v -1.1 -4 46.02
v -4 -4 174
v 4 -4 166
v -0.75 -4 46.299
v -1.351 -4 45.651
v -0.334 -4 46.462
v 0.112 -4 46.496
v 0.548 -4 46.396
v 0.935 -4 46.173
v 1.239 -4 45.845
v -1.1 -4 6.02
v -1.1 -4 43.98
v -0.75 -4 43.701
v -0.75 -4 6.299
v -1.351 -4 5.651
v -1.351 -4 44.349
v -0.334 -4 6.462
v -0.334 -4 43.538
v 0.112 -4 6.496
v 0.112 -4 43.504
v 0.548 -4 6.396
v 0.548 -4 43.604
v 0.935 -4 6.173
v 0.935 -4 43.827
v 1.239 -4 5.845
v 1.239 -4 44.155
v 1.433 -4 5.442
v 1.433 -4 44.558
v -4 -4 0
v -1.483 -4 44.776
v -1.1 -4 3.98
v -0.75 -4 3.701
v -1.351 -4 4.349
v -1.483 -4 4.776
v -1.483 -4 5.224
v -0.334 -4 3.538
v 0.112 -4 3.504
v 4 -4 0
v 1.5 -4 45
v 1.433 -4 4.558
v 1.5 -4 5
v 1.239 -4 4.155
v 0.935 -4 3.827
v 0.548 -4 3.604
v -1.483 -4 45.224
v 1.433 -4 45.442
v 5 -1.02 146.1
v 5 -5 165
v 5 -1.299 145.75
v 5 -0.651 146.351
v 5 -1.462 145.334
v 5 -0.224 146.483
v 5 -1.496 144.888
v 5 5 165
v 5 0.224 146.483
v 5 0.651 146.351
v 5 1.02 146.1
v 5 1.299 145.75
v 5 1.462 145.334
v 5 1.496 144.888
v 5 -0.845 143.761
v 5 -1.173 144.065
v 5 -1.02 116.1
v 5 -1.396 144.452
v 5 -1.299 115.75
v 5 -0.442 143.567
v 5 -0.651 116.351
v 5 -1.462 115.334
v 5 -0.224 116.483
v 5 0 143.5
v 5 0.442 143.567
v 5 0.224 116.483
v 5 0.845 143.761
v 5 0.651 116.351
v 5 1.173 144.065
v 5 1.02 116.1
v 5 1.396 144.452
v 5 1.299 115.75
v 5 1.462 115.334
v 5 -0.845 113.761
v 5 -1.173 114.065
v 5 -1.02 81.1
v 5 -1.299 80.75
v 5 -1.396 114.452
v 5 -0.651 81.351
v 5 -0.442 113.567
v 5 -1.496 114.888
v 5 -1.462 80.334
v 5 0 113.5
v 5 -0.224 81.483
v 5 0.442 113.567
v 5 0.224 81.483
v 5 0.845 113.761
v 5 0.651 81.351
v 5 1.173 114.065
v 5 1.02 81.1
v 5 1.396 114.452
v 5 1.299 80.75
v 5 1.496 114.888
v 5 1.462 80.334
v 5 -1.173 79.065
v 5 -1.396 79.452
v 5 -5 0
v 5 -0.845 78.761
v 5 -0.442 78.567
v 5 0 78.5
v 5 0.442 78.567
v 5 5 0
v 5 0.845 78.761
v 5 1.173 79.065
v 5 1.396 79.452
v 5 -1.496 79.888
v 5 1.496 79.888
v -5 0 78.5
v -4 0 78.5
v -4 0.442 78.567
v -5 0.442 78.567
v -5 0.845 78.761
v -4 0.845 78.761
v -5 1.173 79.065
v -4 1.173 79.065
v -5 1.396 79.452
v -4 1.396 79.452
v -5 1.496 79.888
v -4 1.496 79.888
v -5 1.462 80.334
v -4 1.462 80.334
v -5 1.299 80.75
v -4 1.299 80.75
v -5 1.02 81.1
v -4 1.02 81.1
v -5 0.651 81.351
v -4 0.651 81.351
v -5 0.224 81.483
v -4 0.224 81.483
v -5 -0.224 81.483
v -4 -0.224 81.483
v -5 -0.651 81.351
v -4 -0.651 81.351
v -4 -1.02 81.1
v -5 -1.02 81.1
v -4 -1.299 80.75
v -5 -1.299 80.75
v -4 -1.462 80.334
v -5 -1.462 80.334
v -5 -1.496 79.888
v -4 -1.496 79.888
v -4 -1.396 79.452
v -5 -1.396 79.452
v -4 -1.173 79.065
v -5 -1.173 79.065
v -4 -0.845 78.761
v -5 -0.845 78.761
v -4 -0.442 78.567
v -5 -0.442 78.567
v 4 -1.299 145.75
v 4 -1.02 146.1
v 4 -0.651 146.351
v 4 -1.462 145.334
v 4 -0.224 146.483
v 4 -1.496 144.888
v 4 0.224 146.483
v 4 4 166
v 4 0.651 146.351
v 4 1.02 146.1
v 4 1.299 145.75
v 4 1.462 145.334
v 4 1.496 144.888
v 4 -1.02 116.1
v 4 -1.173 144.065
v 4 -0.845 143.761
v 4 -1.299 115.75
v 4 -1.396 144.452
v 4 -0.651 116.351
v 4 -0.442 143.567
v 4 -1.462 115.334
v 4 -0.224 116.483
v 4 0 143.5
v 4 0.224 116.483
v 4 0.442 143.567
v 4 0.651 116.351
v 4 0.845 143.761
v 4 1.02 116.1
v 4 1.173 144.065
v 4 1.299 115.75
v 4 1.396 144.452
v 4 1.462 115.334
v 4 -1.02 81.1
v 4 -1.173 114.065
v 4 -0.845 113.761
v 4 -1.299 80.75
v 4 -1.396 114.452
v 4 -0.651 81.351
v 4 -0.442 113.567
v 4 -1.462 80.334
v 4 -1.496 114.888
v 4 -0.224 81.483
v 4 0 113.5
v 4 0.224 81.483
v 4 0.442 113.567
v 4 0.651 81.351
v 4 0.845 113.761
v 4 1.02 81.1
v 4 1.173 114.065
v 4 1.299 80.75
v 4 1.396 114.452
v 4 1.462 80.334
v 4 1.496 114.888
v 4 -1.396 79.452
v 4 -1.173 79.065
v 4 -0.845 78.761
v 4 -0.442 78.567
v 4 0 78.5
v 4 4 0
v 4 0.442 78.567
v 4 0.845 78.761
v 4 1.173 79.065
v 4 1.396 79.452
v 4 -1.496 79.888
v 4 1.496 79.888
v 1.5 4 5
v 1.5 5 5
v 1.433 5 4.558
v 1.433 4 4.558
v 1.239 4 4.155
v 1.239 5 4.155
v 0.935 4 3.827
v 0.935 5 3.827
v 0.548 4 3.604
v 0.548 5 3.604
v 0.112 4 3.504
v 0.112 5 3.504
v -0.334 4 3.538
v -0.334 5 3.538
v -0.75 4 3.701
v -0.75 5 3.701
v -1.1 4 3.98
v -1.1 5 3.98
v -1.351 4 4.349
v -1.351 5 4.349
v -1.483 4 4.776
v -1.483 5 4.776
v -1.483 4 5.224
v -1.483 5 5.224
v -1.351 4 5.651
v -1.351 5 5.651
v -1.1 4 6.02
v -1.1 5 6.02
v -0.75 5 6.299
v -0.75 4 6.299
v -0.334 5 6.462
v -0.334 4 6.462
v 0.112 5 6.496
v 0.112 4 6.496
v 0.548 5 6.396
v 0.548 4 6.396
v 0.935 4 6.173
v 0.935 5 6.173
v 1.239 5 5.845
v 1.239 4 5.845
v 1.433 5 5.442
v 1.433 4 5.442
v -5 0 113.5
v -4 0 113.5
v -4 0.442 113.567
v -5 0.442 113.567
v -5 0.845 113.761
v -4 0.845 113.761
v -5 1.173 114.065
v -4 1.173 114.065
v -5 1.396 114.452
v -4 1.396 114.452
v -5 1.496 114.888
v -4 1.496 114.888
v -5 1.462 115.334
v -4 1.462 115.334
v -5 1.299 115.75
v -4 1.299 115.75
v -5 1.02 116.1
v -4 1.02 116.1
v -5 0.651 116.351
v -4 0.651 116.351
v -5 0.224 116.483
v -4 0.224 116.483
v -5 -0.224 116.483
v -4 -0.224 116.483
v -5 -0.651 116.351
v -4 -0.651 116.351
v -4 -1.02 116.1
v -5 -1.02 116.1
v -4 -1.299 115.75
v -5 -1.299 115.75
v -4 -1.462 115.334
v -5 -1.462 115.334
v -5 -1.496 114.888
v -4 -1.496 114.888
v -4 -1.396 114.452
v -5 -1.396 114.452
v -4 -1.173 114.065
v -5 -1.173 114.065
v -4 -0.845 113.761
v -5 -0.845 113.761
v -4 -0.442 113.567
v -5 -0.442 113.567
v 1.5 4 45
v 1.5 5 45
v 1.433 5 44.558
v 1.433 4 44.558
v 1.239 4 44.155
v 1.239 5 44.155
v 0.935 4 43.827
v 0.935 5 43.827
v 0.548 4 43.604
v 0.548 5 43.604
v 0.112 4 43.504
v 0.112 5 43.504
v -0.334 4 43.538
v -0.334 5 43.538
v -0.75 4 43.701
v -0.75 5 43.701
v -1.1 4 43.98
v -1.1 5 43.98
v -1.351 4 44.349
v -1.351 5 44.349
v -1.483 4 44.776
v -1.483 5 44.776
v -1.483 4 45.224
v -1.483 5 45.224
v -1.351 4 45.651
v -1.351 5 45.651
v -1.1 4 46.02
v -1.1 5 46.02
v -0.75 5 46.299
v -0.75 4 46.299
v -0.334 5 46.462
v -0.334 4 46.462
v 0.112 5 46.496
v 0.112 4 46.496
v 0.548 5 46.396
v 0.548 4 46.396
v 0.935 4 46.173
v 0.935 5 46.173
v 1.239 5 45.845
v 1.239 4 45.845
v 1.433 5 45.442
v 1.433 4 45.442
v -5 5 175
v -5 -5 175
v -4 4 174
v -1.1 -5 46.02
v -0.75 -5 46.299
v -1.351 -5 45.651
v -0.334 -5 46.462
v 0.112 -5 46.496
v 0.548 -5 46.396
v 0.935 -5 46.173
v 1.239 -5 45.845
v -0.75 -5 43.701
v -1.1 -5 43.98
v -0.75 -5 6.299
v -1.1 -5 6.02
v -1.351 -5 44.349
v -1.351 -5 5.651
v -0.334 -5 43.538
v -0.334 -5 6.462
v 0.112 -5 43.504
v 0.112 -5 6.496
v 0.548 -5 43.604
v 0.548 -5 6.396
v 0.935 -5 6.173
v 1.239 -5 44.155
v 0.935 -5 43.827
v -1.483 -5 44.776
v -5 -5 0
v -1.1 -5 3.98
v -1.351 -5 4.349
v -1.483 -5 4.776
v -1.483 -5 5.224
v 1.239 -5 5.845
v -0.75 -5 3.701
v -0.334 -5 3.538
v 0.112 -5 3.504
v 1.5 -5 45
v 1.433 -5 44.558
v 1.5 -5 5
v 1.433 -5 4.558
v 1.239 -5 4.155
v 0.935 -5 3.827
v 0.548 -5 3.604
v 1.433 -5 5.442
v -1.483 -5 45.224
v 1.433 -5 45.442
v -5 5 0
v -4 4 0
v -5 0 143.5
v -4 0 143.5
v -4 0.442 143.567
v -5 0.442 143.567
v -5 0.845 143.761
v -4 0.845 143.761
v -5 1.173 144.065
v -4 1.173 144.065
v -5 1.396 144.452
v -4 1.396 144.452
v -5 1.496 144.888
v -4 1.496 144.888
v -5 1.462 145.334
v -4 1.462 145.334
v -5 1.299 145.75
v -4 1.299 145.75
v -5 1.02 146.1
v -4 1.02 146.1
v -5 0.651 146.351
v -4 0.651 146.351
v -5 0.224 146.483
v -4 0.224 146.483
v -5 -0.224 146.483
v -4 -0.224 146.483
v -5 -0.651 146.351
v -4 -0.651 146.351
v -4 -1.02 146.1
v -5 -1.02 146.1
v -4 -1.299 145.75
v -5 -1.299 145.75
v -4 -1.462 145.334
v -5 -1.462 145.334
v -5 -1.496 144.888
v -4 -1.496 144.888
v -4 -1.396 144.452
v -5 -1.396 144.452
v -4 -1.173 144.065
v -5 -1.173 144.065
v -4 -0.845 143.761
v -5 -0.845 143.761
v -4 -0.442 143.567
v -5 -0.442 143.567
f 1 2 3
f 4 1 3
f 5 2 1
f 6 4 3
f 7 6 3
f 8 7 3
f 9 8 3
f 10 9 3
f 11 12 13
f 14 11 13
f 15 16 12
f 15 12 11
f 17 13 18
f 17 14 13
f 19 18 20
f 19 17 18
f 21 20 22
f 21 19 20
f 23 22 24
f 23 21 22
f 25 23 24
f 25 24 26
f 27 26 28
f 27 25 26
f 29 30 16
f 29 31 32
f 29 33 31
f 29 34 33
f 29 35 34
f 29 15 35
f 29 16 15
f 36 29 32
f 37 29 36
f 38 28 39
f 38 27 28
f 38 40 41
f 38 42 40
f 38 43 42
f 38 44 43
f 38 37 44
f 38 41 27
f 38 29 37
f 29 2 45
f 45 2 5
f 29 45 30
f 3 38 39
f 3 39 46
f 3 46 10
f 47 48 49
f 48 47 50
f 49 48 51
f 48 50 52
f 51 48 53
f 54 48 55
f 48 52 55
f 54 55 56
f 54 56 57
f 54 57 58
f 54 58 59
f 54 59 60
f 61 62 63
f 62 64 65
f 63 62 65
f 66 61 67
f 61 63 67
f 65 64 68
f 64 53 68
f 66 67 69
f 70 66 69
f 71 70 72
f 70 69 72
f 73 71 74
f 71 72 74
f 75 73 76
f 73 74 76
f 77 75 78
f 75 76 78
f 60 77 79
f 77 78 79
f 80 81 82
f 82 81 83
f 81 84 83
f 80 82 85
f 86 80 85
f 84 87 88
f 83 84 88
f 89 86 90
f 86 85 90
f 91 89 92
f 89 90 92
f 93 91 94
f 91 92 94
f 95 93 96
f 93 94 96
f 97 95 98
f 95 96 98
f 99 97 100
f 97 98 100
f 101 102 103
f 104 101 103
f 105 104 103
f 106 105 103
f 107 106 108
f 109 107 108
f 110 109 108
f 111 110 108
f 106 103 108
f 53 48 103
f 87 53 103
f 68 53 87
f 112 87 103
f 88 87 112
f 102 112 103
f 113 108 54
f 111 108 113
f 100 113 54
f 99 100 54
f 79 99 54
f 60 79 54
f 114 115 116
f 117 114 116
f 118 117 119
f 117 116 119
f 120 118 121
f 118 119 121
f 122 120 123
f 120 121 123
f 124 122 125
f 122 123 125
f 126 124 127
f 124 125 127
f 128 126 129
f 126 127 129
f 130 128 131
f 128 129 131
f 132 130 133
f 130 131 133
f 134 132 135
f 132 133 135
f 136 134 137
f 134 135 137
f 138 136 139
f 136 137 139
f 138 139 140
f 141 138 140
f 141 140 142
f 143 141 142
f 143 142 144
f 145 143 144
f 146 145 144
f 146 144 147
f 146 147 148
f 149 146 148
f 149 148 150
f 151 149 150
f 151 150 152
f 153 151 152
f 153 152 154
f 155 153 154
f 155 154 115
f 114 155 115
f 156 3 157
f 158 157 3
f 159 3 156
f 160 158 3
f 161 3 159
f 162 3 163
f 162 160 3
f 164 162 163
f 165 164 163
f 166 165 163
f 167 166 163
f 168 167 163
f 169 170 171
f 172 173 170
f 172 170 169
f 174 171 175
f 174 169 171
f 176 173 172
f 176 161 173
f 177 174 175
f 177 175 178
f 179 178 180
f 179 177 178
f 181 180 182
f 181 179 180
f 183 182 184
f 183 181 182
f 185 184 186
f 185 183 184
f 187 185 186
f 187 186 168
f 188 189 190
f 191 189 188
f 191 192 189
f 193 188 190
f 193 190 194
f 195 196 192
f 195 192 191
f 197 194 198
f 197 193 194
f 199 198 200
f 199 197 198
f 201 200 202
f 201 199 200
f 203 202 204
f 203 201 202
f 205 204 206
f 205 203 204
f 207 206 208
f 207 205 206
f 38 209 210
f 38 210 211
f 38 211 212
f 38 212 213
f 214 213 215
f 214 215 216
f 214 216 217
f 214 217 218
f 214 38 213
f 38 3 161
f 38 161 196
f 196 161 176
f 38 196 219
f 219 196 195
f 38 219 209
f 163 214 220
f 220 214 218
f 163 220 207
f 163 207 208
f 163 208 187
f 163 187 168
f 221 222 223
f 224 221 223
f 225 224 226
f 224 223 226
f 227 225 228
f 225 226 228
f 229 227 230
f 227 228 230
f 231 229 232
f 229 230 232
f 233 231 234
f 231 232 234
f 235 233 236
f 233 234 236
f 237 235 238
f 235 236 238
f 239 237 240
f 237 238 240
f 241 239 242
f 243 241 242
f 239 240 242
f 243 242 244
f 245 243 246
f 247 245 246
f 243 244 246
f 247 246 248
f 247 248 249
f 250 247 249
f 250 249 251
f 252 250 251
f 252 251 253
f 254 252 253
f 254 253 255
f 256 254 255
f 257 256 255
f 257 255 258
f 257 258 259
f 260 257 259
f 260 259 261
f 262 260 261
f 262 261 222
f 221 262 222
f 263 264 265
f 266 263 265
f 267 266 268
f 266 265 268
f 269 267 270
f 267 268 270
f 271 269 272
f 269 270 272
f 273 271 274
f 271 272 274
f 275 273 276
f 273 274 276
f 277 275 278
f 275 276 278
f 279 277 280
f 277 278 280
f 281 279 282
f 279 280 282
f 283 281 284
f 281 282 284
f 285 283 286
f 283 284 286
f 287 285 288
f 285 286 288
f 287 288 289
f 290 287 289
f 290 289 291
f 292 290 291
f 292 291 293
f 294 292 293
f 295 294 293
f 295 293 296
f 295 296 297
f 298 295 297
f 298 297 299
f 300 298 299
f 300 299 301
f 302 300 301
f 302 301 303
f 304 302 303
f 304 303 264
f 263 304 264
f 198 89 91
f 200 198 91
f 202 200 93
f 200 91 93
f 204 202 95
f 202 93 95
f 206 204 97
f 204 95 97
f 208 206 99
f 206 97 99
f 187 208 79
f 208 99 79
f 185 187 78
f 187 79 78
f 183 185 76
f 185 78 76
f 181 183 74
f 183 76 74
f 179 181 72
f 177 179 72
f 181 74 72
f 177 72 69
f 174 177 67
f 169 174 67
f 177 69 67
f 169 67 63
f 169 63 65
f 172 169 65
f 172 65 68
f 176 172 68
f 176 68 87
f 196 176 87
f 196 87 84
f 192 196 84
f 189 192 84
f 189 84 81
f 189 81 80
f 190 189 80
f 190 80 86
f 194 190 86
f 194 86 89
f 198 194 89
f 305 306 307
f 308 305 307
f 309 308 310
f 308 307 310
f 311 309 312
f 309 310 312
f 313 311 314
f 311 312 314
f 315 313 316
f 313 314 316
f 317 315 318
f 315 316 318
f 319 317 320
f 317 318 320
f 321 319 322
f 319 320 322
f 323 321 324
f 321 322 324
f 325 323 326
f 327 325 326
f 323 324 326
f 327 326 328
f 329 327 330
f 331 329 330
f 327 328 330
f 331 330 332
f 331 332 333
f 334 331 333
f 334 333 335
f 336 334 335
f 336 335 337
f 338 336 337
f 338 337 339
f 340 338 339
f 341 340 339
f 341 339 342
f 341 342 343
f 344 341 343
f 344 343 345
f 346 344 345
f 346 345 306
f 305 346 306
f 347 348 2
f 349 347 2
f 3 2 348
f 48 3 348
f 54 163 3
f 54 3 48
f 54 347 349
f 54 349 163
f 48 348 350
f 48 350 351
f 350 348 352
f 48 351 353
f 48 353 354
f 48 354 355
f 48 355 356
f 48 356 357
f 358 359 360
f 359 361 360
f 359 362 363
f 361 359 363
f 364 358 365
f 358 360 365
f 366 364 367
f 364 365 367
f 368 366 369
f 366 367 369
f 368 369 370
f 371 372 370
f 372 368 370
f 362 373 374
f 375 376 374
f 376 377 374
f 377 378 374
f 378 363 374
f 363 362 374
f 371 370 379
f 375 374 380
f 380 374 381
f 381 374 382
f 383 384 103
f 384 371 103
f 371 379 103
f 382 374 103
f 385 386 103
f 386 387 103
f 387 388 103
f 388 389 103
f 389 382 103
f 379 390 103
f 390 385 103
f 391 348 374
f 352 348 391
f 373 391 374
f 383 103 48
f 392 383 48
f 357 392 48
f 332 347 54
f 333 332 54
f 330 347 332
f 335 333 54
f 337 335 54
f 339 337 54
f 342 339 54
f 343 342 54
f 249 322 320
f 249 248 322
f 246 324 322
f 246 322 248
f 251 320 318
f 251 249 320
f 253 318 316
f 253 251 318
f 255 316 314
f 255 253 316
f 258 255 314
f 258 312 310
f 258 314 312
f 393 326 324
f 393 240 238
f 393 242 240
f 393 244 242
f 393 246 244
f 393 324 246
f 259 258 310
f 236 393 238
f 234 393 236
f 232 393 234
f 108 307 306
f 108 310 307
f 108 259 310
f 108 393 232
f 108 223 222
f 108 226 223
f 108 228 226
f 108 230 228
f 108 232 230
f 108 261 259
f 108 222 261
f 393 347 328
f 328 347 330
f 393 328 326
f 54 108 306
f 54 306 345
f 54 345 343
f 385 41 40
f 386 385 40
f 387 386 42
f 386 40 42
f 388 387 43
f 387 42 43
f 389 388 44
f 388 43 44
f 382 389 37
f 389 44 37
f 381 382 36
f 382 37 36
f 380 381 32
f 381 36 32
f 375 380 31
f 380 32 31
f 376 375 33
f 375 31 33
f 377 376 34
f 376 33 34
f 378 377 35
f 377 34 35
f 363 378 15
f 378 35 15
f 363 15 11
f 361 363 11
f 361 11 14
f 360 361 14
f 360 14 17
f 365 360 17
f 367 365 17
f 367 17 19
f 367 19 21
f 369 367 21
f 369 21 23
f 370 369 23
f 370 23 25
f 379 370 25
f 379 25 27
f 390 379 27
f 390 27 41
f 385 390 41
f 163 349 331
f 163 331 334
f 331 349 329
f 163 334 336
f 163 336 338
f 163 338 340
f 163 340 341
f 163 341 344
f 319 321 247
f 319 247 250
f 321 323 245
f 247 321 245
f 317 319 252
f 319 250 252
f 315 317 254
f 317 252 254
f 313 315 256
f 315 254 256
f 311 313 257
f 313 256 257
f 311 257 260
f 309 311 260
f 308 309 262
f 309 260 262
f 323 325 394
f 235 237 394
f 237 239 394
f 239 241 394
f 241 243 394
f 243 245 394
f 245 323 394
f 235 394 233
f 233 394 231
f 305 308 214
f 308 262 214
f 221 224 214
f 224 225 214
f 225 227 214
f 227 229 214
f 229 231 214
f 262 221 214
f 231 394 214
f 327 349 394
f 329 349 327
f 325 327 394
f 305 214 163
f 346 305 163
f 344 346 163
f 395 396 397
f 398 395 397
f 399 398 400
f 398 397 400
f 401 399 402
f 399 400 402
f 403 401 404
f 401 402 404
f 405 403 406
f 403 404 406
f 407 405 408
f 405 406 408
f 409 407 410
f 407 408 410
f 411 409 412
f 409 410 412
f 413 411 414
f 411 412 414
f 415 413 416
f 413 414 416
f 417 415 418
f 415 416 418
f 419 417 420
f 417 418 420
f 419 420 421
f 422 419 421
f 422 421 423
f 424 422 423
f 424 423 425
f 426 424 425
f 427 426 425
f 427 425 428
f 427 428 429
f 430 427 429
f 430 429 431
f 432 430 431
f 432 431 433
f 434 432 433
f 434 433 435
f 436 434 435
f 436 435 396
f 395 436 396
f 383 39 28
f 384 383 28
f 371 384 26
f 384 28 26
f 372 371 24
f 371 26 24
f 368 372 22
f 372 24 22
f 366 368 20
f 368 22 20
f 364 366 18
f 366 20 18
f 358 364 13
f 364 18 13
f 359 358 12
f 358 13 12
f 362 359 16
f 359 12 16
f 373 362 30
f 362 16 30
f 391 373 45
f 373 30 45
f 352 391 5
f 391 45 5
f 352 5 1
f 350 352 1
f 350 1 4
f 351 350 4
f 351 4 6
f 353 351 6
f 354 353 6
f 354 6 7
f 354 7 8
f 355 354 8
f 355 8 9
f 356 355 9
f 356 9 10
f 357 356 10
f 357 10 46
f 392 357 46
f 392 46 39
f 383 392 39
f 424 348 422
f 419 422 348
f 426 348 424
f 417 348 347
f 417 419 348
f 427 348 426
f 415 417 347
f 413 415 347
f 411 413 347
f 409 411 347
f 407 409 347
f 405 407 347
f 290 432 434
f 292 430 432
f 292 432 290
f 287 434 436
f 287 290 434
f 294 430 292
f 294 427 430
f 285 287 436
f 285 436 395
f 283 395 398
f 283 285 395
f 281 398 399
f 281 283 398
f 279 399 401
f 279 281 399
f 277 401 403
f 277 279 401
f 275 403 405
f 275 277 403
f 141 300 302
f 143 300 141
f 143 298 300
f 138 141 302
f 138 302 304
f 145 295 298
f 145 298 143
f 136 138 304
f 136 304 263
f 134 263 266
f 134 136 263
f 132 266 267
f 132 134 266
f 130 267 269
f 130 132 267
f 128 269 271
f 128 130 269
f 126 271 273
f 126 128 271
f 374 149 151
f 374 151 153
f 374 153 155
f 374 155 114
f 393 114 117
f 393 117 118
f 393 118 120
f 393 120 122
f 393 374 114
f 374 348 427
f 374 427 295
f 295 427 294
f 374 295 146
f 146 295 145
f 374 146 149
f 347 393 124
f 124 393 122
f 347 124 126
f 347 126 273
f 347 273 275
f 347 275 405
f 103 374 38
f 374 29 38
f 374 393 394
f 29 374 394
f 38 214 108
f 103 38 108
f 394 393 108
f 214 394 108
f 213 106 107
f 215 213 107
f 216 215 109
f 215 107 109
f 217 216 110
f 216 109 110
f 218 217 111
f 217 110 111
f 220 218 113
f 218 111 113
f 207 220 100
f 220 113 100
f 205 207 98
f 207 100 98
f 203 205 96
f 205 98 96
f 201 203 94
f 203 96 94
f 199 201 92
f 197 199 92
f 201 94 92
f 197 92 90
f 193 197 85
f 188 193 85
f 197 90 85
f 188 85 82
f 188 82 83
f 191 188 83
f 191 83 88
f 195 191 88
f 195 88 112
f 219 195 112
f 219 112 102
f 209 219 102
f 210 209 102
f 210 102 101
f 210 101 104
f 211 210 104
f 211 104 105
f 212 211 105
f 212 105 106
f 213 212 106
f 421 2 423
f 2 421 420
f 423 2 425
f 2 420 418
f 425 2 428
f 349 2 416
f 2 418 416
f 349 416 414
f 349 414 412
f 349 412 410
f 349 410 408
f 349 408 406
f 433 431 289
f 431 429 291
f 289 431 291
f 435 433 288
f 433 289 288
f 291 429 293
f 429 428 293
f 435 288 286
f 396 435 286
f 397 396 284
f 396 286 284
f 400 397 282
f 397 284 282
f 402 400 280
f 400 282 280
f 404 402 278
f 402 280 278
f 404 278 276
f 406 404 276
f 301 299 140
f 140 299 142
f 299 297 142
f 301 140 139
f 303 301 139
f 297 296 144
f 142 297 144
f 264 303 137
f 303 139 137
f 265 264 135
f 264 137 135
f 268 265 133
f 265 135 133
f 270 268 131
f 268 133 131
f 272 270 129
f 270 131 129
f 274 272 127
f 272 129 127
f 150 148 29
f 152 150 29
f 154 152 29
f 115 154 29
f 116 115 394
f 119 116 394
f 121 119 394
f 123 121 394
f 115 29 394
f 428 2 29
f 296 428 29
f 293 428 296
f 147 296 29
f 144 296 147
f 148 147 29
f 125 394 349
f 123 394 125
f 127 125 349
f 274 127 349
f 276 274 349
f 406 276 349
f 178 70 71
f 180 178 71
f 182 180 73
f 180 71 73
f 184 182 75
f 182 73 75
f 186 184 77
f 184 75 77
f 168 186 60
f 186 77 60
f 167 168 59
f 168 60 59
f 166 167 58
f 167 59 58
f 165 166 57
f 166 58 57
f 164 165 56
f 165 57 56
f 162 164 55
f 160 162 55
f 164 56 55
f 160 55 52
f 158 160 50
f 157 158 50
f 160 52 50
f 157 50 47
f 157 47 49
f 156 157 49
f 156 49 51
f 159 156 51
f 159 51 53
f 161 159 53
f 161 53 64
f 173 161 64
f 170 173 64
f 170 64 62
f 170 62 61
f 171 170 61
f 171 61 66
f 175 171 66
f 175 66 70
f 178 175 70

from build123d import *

# Parameters (mm, degrees)
SKETCH_1_W          = 10
SKETCH_1_H          = 10
SKETCH_1_W_2        = 8
SKETCH_1_H_2        = 8
EXTRUDE_1_DEPTH     = 175
SKETCH_2_R          = 1.5
CUT_EXTRUDE_1_DEPTH = 11
SKETCH_3_R          = 1.5
CUT_EXTRUDE_2_DEPTH = 10


with BuildPart() as part:
    # 草图1 → 拉伸-薄壁1 (new body)
    with BuildSketch(Plane.XY):
        Rectangle(SKETCH_1_W, SKETCH_1_H)
        Rectangle(SKETCH_1_W_2, SKETCH_1_H_2, mode=Mode.SUBTRACT)
    extrude(amount=EXTRUDE_1_DEPTH)

    # 草图2 → 切除-拉伸1 (cut, through all)
    with BuildSketch(Plane(origin=(5, 0, 0), x_dir=(0, 0, -1), z_dir=(1, 0, 0))):
        with Locations((-80, 0)):
            Circle(SKETCH_2_R)
        with Locations((-115, 0)):
            Circle(SKETCH_2_R)
        with Locations((-145, 0)):
            Circle(SKETCH_2_R)
    extrude(amount=-CUT_EXTRUDE_1_DEPTH, mode=Mode.SUBTRACT)

    # 草图3 → 切除-拉伸2 (cut)
    with BuildSketch(Plane(origin=(0, 5, 0), x_dir=(1, 0, 0), z_dir=(0, 1, 0))):
        with Locations((0, -5)):
            Circle(SKETCH_3_R)
        with Locations((0, -45)):
            Circle(SKETCH_3_R)
        Polygon((5, -165), (5, -175), (-5, -175), align=None)
    extrude(amount=-CUT_EXTRUDE_2_DEPTH, mode=Mode.SUBTRACT)


solid = part.part
